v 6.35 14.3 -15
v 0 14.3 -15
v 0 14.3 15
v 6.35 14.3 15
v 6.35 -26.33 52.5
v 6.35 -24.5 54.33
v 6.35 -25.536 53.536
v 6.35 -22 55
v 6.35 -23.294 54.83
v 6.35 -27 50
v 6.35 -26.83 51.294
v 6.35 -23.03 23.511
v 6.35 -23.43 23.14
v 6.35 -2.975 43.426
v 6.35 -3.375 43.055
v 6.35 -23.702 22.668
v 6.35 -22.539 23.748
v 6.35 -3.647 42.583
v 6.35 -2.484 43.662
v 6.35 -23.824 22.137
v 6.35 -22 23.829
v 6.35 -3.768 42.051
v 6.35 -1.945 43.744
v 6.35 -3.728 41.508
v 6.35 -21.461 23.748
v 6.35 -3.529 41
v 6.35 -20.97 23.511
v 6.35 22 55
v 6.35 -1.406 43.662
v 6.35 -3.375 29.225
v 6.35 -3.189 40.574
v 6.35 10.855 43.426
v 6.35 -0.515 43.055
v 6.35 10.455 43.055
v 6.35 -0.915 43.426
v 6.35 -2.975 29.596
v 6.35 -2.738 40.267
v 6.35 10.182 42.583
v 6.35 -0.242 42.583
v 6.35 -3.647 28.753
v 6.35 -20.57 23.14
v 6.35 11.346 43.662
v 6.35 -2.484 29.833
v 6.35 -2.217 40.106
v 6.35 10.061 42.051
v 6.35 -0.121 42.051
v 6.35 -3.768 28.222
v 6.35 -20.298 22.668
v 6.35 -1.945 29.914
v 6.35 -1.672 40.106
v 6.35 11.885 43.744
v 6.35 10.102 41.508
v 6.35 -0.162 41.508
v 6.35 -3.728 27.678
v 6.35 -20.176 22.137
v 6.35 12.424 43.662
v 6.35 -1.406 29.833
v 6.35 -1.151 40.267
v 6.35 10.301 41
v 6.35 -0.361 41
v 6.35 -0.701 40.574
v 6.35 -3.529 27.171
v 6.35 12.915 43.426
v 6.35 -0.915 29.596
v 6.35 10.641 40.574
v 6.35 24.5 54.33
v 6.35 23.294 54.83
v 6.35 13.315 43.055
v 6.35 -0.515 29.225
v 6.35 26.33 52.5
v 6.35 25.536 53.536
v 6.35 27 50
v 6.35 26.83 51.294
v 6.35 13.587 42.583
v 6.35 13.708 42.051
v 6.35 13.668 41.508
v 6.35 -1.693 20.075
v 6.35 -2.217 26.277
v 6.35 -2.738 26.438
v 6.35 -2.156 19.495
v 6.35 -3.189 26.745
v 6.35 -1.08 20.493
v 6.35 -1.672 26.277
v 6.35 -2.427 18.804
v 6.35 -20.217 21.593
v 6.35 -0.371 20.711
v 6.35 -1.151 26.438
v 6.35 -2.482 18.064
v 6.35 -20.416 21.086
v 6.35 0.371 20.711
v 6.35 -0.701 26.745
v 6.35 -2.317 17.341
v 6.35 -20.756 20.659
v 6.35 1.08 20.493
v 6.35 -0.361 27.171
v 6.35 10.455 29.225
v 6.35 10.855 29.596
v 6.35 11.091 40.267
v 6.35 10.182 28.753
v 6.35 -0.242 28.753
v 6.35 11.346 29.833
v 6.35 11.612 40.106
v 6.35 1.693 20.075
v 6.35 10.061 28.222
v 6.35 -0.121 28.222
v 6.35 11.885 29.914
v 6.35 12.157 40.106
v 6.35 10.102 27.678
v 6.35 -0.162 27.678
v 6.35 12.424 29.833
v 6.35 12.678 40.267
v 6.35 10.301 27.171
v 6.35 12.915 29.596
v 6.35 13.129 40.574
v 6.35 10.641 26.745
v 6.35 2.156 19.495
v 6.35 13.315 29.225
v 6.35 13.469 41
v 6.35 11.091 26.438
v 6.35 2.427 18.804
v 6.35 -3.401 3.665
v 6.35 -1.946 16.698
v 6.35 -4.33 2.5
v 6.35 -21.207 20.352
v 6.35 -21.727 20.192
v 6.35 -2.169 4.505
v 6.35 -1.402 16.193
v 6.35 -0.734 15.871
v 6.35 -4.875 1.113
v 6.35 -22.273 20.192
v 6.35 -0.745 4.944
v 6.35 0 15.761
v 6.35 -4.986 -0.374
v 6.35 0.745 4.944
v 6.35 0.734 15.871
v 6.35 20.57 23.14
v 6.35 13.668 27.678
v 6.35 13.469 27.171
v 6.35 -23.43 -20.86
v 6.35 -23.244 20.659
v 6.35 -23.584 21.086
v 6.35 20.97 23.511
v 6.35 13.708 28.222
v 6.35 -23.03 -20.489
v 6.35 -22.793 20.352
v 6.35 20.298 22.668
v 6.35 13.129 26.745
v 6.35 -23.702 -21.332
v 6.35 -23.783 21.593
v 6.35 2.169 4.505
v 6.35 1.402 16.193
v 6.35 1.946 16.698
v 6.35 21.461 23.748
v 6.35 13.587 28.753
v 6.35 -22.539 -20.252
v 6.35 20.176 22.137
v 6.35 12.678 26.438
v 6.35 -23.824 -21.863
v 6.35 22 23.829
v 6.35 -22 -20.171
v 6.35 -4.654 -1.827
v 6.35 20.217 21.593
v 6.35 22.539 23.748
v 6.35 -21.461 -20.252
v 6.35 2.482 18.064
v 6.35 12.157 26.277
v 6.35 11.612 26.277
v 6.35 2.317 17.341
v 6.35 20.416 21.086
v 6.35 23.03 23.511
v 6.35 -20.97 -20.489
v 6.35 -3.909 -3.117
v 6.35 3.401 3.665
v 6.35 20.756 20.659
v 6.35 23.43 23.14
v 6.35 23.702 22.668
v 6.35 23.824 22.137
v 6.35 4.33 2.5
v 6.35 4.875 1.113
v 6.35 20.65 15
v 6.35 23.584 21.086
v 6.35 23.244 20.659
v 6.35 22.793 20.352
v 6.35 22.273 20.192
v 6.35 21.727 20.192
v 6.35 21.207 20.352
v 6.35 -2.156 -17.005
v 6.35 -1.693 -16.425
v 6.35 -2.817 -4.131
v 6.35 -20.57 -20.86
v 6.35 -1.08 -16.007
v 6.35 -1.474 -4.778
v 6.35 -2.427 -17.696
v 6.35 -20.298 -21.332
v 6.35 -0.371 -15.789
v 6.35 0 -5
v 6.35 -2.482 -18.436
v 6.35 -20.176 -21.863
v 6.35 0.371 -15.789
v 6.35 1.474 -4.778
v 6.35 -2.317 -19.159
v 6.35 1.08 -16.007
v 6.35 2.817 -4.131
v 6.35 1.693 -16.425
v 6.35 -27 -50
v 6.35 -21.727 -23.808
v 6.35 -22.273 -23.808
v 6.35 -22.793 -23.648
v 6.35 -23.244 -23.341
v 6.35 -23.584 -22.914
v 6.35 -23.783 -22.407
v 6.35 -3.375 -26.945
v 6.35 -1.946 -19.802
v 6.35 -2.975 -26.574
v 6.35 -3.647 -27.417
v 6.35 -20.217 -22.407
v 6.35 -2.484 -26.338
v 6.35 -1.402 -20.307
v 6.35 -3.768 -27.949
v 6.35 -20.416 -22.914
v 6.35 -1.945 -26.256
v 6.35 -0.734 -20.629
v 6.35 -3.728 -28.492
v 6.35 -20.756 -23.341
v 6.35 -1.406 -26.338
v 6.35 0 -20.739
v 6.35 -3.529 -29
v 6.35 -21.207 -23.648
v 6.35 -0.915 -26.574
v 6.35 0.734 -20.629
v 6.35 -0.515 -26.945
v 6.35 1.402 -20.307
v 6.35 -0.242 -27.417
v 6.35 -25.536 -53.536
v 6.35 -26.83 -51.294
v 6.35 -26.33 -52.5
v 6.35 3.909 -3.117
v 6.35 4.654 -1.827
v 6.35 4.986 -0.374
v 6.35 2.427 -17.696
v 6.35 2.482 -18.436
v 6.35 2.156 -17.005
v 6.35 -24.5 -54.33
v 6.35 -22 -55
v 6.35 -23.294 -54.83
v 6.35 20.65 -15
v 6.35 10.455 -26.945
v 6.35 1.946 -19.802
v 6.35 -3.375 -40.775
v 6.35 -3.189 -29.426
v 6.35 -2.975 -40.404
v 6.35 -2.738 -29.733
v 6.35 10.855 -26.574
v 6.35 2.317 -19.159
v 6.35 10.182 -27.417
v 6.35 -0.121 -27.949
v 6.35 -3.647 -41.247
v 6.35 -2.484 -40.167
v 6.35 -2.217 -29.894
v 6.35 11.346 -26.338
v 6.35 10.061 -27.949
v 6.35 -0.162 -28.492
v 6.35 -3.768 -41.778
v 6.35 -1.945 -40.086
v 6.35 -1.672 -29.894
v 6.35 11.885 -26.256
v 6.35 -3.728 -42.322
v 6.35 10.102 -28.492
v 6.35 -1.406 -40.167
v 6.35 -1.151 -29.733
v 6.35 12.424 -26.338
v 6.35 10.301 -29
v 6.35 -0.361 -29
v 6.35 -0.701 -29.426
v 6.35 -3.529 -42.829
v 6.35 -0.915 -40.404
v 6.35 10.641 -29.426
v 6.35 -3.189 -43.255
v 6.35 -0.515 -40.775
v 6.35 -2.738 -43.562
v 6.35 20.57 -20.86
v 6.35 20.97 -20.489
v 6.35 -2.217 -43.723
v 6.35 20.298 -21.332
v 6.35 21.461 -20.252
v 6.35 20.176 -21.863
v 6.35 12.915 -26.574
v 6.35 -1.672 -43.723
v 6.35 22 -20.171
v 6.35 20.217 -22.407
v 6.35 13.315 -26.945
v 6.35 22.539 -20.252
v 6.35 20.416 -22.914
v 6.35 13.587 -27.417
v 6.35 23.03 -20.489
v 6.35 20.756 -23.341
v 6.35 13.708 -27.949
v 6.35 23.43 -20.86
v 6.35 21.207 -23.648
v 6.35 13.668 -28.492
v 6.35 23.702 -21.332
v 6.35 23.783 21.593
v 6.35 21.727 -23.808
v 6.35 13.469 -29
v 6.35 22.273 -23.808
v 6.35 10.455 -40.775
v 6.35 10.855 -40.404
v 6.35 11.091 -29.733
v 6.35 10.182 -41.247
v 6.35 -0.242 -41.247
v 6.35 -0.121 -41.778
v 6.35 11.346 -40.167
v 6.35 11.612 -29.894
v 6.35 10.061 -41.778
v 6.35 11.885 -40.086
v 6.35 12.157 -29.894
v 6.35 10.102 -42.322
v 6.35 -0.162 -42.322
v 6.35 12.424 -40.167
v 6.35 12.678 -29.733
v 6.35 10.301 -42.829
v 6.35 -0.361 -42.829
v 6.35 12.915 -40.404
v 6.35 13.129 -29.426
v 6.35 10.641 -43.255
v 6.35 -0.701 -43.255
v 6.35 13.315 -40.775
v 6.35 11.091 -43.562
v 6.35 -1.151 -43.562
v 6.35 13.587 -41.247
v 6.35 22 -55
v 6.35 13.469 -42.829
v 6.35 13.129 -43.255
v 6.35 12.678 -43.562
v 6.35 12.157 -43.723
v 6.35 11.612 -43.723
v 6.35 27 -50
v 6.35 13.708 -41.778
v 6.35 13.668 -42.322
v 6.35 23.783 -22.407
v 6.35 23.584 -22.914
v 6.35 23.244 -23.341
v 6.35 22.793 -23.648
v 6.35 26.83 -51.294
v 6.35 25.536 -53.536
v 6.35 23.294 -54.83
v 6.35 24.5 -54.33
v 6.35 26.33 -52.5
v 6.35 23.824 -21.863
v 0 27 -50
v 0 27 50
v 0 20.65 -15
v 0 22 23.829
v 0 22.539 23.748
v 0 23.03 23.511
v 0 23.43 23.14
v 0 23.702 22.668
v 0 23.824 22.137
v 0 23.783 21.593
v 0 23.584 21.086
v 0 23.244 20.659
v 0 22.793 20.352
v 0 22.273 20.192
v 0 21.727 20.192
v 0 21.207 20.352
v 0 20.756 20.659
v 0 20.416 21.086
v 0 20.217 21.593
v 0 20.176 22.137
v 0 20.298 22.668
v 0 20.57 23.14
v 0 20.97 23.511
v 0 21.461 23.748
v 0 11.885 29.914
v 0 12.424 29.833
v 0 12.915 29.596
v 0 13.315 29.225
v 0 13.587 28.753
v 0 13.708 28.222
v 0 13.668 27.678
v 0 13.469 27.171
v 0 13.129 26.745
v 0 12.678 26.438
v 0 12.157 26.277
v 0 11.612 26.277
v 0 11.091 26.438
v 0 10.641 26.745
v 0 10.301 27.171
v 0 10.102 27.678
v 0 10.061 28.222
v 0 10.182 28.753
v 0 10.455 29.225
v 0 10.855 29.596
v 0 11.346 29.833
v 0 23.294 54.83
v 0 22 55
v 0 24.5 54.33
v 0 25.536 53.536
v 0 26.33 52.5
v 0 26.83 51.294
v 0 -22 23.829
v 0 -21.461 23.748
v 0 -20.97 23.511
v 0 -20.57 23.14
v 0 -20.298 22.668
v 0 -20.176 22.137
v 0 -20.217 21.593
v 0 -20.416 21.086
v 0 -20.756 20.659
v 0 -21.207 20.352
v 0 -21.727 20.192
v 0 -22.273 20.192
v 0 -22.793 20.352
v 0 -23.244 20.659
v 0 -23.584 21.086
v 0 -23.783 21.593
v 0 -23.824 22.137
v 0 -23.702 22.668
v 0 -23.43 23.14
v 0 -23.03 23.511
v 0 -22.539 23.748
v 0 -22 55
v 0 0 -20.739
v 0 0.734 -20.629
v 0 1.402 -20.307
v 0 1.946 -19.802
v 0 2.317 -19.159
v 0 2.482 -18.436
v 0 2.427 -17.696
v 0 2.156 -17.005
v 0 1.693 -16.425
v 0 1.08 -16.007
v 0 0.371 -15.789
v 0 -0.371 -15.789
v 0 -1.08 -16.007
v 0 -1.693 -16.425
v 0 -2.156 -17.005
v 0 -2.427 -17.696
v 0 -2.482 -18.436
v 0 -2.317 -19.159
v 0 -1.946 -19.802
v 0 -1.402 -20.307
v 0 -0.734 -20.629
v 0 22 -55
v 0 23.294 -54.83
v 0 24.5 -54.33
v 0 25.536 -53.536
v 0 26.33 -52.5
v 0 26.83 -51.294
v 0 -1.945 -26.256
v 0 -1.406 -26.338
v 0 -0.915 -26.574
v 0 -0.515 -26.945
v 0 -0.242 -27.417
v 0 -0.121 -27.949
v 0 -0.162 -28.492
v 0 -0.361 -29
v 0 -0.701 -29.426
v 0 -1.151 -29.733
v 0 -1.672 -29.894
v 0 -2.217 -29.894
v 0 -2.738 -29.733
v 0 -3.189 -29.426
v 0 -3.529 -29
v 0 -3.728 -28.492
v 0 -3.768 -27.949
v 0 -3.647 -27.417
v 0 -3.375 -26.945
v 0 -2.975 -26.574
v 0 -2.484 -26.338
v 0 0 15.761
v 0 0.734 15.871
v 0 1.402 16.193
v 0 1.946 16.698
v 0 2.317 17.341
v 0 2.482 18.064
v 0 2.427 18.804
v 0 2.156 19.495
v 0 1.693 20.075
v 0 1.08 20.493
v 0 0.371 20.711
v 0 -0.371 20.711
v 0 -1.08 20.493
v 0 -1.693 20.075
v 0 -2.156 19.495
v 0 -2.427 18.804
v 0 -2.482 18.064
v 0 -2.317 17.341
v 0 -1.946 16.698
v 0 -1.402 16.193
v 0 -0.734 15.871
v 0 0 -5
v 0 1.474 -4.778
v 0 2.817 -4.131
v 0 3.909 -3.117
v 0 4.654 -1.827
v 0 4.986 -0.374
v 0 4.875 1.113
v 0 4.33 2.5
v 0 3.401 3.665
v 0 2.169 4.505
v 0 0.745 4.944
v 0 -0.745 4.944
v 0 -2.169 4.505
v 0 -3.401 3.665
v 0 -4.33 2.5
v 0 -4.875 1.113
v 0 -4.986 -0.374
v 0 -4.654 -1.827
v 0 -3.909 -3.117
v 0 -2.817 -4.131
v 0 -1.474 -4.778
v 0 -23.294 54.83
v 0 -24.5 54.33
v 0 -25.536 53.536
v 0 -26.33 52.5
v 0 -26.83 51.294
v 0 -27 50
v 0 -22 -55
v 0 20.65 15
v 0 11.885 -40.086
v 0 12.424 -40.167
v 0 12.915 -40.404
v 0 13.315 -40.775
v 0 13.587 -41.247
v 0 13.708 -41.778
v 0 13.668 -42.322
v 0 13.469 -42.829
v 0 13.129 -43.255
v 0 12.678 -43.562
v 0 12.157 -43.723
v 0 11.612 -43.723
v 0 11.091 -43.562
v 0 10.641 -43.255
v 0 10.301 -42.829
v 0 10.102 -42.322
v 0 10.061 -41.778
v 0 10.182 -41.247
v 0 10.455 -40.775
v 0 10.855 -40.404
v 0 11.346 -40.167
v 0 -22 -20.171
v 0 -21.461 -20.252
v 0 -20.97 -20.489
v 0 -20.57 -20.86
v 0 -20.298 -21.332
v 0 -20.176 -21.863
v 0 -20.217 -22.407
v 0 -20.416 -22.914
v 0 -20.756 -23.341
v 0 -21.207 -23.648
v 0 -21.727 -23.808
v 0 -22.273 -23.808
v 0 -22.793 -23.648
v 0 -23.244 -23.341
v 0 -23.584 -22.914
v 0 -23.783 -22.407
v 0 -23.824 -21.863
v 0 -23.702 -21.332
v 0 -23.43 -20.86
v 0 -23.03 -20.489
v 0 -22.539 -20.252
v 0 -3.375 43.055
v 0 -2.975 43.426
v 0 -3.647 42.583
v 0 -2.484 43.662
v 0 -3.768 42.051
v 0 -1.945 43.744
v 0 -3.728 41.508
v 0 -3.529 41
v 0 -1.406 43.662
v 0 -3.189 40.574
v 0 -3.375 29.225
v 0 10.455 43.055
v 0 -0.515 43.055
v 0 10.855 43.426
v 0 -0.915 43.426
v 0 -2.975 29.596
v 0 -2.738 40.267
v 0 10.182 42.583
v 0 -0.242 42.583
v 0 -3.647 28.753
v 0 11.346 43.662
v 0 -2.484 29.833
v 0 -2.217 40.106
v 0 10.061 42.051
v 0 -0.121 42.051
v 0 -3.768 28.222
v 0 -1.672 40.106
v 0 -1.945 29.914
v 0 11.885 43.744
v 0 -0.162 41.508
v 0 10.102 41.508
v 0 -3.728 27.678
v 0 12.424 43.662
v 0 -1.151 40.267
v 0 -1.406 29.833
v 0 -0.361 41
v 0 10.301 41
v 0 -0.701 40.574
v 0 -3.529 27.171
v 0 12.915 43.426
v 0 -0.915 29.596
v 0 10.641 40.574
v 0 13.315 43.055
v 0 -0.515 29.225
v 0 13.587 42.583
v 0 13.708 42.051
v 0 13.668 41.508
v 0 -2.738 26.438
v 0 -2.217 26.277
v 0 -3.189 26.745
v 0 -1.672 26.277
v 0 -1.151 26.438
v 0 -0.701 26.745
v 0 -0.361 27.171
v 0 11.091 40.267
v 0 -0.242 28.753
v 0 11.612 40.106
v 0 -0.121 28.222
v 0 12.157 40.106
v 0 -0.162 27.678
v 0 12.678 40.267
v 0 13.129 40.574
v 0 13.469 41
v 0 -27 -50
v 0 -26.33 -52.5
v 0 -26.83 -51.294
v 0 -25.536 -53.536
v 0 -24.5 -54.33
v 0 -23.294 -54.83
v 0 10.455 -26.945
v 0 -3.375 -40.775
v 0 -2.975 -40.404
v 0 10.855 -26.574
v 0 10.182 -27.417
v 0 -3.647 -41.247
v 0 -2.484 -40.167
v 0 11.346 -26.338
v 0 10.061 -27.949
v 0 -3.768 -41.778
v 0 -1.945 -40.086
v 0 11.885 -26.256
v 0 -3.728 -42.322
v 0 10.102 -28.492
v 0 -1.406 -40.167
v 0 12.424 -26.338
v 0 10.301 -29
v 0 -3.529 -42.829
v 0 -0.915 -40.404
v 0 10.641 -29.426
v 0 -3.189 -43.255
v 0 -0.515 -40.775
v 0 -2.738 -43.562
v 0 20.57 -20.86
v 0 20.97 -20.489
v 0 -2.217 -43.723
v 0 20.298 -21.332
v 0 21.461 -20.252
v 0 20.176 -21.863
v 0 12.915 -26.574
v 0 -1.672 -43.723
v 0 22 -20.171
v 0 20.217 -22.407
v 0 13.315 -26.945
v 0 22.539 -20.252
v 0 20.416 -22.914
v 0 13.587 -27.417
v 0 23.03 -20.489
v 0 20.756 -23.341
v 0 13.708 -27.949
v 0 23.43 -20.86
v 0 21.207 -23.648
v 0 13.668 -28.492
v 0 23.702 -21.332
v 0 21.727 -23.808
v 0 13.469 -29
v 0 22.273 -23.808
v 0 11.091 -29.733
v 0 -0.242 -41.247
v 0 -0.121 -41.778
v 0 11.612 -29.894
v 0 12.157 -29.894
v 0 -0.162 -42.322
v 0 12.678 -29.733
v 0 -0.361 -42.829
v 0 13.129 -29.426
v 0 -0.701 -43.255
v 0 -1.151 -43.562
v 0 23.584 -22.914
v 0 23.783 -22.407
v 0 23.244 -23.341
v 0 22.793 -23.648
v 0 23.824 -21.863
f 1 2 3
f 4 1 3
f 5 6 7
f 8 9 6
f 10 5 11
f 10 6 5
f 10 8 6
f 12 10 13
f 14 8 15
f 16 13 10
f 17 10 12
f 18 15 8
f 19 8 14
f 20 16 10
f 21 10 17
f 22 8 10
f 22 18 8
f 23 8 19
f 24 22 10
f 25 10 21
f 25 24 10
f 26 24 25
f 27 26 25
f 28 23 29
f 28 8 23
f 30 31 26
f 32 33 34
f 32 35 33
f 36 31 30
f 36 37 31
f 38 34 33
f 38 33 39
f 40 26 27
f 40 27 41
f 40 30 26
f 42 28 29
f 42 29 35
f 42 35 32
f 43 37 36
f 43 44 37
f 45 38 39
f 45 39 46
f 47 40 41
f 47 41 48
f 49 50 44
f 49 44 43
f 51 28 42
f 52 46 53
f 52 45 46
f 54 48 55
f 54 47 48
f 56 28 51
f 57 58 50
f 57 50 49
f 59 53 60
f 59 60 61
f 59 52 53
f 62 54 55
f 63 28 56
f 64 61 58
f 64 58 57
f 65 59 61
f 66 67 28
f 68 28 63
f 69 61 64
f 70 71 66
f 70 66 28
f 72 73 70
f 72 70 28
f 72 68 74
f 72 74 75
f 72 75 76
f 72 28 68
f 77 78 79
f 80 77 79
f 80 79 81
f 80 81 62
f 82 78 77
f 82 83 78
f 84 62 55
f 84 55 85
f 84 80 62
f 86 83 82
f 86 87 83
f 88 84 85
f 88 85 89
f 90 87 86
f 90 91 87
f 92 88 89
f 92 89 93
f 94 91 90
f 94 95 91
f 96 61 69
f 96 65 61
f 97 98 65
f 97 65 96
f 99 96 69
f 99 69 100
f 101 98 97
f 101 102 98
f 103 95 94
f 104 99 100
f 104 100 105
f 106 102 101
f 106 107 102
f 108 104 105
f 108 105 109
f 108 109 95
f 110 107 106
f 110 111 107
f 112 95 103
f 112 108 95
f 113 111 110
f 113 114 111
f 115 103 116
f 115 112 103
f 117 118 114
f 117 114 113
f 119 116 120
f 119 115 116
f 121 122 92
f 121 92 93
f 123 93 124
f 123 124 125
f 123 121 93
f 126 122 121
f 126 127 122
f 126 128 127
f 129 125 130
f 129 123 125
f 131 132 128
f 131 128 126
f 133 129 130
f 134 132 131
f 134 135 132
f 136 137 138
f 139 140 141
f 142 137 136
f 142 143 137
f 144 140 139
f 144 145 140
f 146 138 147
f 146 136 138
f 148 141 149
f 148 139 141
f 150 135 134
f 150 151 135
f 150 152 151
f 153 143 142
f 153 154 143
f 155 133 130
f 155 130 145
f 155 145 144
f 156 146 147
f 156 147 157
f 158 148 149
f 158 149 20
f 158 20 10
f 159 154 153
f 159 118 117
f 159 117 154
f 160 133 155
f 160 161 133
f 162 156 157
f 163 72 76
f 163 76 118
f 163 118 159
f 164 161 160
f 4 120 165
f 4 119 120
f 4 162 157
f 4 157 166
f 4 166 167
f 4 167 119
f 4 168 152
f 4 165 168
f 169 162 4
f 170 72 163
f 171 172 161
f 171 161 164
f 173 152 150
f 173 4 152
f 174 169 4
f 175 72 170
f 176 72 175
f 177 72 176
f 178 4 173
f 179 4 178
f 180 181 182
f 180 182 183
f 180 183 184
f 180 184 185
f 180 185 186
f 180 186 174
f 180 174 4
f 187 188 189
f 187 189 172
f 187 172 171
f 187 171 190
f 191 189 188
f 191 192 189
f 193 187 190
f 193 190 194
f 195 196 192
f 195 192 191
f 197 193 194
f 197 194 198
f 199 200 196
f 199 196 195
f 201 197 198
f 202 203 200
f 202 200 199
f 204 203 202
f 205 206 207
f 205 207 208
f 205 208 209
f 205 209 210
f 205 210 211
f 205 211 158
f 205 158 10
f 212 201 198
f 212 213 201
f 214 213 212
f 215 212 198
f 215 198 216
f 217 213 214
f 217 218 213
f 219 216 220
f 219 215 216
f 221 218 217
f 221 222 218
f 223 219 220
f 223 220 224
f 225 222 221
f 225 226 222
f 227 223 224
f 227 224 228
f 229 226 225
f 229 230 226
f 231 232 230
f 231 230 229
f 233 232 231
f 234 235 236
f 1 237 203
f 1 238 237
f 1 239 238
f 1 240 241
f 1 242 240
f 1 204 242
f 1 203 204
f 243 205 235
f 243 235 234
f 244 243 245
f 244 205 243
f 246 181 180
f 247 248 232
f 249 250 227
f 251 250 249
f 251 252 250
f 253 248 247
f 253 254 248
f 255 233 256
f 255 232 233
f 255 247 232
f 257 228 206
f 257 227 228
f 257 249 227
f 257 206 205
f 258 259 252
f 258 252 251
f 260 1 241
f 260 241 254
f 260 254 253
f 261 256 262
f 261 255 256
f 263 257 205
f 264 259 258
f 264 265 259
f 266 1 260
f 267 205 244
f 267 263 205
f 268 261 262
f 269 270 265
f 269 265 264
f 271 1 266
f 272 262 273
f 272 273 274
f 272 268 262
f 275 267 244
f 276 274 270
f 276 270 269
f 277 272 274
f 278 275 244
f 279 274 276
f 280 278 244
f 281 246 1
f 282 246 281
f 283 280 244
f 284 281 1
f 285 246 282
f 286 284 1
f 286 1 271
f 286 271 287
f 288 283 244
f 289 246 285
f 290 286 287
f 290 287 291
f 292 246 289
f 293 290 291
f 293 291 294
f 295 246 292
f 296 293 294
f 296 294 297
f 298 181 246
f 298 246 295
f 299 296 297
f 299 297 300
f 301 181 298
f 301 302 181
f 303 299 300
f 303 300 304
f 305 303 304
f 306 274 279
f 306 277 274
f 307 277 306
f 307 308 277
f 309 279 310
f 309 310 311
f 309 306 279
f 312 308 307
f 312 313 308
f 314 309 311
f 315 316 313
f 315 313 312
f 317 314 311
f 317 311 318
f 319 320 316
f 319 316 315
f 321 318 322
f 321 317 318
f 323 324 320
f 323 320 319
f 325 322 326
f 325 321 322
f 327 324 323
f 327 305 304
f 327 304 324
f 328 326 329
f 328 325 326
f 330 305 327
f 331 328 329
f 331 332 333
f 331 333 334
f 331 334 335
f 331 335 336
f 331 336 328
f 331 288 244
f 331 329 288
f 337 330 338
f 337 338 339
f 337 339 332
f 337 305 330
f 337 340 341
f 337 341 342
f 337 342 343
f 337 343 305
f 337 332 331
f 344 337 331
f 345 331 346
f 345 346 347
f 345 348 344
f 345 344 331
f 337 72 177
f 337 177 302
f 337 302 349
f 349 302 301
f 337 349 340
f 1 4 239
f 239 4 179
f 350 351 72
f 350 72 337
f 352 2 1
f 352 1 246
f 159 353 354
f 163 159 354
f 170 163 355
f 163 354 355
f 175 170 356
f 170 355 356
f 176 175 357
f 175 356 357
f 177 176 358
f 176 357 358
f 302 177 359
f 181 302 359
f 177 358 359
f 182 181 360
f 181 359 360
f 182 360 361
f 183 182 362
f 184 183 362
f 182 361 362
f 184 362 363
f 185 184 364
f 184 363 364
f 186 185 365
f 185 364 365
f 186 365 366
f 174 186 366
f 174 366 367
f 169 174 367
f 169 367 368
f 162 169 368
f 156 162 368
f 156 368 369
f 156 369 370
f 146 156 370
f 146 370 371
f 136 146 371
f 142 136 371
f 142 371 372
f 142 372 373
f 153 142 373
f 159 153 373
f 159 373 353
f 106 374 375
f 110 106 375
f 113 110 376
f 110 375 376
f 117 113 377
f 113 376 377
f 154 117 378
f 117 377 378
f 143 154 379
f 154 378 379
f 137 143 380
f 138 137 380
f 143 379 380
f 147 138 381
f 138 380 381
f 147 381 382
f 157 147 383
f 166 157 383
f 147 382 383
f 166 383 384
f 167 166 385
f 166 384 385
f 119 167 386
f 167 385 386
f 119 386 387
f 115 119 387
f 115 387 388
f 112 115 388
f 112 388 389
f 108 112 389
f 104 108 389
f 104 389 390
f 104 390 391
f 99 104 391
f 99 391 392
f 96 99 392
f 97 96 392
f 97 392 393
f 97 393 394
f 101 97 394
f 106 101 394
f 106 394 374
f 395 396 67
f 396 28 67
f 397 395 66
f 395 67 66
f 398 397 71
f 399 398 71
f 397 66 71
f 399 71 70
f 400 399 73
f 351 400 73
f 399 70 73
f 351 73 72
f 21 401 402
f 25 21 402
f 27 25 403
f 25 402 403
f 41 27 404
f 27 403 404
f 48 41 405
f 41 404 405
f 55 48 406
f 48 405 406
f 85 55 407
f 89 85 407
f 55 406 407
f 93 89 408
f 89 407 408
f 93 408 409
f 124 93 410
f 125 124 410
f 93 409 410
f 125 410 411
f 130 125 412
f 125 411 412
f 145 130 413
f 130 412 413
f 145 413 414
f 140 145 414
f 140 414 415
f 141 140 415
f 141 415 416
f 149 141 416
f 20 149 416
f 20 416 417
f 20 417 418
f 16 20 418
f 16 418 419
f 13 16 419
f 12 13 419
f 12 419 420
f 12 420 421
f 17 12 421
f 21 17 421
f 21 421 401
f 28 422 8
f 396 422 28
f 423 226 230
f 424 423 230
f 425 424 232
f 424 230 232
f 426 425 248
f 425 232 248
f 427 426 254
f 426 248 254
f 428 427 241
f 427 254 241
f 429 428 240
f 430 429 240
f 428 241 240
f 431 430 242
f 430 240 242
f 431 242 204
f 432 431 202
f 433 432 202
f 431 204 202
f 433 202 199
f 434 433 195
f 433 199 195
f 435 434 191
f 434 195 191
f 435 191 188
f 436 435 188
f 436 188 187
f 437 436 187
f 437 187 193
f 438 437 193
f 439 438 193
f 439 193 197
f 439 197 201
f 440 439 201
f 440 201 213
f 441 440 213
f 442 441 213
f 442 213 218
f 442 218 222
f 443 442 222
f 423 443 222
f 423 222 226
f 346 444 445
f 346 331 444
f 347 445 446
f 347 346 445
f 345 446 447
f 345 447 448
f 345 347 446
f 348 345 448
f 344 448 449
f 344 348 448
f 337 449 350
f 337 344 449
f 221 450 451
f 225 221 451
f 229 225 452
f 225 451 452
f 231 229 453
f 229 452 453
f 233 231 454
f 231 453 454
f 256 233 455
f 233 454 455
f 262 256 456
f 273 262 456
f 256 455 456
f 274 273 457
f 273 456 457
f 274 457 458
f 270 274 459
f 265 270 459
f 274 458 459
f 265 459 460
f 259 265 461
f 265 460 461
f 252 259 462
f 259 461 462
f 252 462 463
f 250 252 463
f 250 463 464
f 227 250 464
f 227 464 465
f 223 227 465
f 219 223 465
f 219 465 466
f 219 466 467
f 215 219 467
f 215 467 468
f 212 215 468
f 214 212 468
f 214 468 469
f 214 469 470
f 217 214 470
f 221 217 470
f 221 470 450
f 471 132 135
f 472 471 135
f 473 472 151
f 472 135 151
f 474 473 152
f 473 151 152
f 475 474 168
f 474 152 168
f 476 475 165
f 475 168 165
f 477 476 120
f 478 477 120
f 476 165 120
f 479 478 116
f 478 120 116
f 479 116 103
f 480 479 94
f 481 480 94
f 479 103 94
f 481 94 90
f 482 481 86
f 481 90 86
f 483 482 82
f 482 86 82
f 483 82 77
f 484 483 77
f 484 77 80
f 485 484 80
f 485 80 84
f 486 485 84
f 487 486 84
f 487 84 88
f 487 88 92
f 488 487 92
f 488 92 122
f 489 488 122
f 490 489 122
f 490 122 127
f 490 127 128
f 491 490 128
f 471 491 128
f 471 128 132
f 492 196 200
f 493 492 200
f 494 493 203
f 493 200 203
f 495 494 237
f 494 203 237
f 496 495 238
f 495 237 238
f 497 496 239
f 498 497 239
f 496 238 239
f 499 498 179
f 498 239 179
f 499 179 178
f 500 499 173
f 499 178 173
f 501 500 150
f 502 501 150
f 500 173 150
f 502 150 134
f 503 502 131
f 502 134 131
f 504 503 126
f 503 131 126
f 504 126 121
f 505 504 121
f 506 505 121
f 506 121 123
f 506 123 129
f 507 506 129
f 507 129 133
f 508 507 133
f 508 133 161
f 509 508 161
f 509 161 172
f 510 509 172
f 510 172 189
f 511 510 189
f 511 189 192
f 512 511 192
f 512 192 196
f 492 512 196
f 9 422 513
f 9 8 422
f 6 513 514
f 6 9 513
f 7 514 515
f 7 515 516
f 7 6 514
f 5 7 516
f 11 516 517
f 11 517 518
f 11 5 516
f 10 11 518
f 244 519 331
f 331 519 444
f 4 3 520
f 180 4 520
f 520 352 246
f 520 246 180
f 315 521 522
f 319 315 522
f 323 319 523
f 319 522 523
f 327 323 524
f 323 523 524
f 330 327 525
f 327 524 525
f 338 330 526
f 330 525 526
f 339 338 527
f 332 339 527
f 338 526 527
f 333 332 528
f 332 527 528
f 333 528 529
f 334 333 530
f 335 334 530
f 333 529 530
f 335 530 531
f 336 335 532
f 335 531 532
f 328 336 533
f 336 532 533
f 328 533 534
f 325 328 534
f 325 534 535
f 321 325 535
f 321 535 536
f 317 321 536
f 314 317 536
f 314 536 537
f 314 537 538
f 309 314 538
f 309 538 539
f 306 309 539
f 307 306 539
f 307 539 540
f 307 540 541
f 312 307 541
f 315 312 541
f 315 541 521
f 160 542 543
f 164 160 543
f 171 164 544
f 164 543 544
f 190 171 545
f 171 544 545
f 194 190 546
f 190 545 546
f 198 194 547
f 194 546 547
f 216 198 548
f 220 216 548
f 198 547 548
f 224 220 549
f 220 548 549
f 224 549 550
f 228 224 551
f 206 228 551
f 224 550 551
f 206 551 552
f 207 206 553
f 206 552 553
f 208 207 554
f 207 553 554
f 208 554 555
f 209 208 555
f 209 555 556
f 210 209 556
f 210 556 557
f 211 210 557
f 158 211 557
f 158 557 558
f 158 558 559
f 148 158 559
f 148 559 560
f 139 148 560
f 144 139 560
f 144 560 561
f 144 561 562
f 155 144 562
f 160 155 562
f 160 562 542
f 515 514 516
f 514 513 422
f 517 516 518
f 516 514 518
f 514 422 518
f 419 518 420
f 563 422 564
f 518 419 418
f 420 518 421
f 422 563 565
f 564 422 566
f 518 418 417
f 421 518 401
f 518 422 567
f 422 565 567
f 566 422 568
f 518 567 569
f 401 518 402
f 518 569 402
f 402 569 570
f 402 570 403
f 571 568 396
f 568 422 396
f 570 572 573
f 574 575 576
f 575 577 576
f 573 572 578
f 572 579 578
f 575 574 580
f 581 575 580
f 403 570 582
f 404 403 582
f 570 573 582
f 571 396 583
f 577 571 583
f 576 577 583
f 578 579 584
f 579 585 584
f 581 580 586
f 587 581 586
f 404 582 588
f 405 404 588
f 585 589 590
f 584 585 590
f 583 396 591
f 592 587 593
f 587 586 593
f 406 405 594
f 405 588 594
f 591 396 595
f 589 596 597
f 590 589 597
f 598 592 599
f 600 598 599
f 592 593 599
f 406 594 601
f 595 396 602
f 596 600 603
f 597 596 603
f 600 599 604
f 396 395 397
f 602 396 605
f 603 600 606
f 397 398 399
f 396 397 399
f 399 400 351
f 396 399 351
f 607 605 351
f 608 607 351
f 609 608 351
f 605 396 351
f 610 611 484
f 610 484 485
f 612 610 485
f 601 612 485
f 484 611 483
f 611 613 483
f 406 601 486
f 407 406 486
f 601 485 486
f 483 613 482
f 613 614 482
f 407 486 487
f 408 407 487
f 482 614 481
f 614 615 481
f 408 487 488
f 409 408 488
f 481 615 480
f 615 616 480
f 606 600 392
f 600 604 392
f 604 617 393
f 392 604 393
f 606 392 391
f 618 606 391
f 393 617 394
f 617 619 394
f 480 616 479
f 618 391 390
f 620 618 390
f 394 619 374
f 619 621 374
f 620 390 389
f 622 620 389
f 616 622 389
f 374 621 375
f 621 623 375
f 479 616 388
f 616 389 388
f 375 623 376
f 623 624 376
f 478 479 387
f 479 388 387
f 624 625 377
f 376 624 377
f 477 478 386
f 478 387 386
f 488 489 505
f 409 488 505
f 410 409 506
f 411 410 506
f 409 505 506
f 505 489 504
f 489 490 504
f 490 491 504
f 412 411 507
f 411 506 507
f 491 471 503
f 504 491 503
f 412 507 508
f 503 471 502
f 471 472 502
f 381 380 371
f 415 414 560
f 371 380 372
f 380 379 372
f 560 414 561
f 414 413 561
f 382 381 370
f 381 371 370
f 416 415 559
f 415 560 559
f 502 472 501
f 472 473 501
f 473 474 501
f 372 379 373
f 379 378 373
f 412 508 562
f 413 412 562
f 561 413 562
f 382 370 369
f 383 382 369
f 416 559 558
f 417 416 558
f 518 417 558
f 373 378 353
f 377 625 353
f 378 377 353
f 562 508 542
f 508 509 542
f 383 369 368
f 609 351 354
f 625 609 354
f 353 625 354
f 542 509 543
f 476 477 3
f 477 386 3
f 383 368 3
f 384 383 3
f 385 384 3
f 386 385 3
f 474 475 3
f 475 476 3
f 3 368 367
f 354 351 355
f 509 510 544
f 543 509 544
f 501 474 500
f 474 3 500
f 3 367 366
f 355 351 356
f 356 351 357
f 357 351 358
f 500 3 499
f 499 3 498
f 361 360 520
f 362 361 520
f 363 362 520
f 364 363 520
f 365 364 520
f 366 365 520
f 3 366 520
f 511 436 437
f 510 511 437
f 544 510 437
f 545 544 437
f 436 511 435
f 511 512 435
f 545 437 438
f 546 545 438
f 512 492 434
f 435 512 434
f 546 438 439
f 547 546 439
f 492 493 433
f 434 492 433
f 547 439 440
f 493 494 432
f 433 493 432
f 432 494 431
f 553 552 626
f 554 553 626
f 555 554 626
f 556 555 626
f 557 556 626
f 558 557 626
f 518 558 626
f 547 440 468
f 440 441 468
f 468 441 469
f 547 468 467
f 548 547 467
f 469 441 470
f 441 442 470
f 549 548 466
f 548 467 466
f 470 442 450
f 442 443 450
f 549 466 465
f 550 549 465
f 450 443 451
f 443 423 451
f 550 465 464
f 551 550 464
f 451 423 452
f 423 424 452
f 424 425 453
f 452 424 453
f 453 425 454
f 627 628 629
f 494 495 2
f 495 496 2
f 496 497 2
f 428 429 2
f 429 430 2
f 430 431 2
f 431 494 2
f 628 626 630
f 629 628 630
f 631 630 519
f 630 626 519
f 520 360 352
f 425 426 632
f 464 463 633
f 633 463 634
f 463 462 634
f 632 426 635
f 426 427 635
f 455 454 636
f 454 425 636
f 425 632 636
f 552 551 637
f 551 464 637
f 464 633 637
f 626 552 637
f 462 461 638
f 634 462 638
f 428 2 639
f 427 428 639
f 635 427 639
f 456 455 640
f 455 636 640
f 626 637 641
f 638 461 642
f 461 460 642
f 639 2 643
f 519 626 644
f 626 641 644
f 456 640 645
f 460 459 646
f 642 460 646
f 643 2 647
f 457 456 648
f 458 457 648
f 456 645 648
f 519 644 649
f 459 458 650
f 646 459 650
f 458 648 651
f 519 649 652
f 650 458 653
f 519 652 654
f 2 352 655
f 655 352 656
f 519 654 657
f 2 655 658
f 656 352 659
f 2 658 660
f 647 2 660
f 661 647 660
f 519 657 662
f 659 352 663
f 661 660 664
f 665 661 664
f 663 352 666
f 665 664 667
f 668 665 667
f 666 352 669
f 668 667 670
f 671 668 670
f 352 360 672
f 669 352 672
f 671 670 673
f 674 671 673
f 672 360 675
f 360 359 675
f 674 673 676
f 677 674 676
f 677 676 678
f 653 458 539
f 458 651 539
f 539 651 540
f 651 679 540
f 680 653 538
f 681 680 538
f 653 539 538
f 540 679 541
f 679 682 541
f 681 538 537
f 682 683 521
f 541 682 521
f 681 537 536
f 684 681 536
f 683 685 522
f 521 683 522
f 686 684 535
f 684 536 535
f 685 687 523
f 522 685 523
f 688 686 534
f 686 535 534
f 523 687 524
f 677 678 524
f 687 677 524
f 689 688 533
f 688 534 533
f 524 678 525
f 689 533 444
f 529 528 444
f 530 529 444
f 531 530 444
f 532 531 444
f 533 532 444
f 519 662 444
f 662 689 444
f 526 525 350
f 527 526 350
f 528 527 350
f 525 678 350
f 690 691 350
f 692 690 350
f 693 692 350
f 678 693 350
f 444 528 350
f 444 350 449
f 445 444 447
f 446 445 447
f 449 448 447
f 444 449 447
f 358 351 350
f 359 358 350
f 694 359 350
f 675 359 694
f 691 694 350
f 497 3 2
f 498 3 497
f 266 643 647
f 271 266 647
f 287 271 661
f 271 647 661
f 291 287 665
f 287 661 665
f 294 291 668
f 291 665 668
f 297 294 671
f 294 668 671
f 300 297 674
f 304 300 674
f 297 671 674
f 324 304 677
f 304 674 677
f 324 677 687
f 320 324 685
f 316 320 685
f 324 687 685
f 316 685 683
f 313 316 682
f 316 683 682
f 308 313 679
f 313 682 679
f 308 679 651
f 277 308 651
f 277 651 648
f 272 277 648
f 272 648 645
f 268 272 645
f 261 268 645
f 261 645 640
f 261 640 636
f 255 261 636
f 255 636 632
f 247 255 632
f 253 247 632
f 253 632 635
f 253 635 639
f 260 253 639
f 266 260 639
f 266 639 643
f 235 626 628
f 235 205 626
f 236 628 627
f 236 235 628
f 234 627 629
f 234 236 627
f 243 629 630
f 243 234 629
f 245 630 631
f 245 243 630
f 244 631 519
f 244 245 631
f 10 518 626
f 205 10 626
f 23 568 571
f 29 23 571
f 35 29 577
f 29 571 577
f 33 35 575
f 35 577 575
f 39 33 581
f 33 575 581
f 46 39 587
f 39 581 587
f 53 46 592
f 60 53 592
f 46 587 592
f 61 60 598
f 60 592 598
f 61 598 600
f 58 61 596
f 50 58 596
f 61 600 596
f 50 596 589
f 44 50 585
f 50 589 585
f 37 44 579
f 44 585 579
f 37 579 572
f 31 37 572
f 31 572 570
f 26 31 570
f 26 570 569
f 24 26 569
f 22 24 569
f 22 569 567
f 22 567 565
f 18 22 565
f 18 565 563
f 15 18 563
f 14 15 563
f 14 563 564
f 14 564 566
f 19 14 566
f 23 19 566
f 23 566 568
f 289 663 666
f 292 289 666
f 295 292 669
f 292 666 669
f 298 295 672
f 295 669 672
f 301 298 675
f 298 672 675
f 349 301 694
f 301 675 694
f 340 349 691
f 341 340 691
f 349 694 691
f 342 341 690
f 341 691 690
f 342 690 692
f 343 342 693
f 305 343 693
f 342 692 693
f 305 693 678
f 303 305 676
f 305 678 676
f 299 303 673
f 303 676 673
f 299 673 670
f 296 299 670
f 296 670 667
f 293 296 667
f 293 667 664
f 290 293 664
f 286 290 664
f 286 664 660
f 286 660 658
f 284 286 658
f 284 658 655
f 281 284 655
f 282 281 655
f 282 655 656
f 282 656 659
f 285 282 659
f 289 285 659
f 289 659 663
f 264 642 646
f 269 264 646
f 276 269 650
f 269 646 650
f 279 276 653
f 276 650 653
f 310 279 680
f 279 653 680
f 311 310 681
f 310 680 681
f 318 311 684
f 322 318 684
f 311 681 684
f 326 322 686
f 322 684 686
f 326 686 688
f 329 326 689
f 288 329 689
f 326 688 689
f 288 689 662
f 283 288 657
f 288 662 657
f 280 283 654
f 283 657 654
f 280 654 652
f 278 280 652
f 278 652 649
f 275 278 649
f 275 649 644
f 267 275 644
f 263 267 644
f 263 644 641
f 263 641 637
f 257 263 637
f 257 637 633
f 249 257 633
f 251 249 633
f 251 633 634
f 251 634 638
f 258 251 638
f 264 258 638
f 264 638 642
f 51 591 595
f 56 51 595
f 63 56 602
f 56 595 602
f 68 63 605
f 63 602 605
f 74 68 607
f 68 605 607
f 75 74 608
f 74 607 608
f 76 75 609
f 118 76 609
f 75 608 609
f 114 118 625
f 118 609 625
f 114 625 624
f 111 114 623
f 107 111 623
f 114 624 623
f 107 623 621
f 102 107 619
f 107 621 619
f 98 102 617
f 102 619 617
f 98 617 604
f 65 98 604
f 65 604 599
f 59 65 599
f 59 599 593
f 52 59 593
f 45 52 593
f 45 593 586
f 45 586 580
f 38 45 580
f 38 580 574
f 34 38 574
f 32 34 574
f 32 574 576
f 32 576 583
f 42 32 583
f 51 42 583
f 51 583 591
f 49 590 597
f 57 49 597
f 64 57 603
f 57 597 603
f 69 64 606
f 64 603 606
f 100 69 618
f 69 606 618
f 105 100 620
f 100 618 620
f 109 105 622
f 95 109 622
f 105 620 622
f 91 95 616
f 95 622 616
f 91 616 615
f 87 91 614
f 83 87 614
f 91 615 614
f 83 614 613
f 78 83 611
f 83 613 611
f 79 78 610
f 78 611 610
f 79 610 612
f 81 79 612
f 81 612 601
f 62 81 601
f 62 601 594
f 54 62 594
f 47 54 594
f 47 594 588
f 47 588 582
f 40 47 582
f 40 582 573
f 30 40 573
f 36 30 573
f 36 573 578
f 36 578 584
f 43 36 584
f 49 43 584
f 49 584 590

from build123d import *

# Parameters (mm, degrees)
SKETCH1_W              = 110
SKETCH1_H              = 54
BOSS_EXTRUDE1_DEPTH    = 6.35
FILLET1_R              = 5
F_6_CLEARANCE_HOLE1_D  = 3.6576
SKETCH5_R              = 5
CUT_EXTRUDE1_DEPTH     = 7.35
F_6_CLEARANCE_HOLE2_D  = 3.6576
SKETCH10_W             = 30
SKETCH10_H             = 6.35
CUT_EXTRUDE2_DEPTH     = 7.35
F_10_CLEARANCE_HOLE1_D = 4.9784


with BuildPart() as part:
    # Sketch1 → Boss-Extrude1 (new body)
    with BuildSketch(Plane(origin=(0, 0, 0), x_dir=(0, 0, -1), z_dir=(1, 0, 0))):
        Rectangle(SKETCH1_W, SKETCH1_H)
    extrude(amount=BOSS_EXTRUDE1_DEPTH)

    # Fillet1
    fillet1_edges = [part.edges().sort_by_distance(p)[0] for p in [
        (3.175, -27, -55),
        (3.175, -27, 55),
        (3.175, 27, 55),
        (3.175, 27, -55),
    ]]
    fillet(fillet1_edges, radius=FILLET1_R)

    # #6 Clearance Hole1 (through all)
    with Locations(Plane(origin=(6.35, 0, 0), x_dir=(0, 0, -1), z_dir=(1, 0, 0))):
        with Locations((-22, 22), (22, 22), (22, -22), (-22, -22)):
            Hole(F_6_CLEARANCE_HOLE1_D / 2)

    # Sketch5 → Cut-Extrude1 (cut, through all)
    with BuildSketch(Plane(origin=(6.35, 0, 0), x_dir=(0, 0, -1), z_dir=(1, 0, 0))):
        Circle(SKETCH5_R)
    extrude(amount=-CUT_EXTRUDE1_DEPTH, mode=Mode.SUBTRACT)

    # #6 Clearance Hole2 (through all)
    with Locations(Plane(origin=(6.35, 0, 0), x_dir=(0, 0, -1), z_dir=(1, 0, 0))):
        with Locations((-41.914797213, 11.884797213), (-28.085202787, 11.884797213), (-28.085202787, -1.944797213), (-41.914797213, -1.944797213), (28.085202787, 11.884797213), (28.085202787, -1.944797213), (41.914797213, -1.944797213), (41.914797213, 11.884797213)):
            Hole(F_6_CLEARANCE_HOLE2_D / 2)

    # Sketch10 → Cut-Extrude2 (cut, through all)
    with BuildSketch(Plane.ZY):
        with Locations((0, 17.475)):
            Rectangle(SKETCH10_W, SKETCH10_H)
    extrude(amount=-CUT_EXTRUDE2_DEPTH, mode=Mode.SUBTRACT)

    # #10 Clearance Hole1 (through all)
    with Locations(Plane.ZY):
        with Locations((18.25, 0), (-18.25, 0)):
            Hole(F_10_CLEARANCE_HOLE1_D / 2)


solid = part.part
